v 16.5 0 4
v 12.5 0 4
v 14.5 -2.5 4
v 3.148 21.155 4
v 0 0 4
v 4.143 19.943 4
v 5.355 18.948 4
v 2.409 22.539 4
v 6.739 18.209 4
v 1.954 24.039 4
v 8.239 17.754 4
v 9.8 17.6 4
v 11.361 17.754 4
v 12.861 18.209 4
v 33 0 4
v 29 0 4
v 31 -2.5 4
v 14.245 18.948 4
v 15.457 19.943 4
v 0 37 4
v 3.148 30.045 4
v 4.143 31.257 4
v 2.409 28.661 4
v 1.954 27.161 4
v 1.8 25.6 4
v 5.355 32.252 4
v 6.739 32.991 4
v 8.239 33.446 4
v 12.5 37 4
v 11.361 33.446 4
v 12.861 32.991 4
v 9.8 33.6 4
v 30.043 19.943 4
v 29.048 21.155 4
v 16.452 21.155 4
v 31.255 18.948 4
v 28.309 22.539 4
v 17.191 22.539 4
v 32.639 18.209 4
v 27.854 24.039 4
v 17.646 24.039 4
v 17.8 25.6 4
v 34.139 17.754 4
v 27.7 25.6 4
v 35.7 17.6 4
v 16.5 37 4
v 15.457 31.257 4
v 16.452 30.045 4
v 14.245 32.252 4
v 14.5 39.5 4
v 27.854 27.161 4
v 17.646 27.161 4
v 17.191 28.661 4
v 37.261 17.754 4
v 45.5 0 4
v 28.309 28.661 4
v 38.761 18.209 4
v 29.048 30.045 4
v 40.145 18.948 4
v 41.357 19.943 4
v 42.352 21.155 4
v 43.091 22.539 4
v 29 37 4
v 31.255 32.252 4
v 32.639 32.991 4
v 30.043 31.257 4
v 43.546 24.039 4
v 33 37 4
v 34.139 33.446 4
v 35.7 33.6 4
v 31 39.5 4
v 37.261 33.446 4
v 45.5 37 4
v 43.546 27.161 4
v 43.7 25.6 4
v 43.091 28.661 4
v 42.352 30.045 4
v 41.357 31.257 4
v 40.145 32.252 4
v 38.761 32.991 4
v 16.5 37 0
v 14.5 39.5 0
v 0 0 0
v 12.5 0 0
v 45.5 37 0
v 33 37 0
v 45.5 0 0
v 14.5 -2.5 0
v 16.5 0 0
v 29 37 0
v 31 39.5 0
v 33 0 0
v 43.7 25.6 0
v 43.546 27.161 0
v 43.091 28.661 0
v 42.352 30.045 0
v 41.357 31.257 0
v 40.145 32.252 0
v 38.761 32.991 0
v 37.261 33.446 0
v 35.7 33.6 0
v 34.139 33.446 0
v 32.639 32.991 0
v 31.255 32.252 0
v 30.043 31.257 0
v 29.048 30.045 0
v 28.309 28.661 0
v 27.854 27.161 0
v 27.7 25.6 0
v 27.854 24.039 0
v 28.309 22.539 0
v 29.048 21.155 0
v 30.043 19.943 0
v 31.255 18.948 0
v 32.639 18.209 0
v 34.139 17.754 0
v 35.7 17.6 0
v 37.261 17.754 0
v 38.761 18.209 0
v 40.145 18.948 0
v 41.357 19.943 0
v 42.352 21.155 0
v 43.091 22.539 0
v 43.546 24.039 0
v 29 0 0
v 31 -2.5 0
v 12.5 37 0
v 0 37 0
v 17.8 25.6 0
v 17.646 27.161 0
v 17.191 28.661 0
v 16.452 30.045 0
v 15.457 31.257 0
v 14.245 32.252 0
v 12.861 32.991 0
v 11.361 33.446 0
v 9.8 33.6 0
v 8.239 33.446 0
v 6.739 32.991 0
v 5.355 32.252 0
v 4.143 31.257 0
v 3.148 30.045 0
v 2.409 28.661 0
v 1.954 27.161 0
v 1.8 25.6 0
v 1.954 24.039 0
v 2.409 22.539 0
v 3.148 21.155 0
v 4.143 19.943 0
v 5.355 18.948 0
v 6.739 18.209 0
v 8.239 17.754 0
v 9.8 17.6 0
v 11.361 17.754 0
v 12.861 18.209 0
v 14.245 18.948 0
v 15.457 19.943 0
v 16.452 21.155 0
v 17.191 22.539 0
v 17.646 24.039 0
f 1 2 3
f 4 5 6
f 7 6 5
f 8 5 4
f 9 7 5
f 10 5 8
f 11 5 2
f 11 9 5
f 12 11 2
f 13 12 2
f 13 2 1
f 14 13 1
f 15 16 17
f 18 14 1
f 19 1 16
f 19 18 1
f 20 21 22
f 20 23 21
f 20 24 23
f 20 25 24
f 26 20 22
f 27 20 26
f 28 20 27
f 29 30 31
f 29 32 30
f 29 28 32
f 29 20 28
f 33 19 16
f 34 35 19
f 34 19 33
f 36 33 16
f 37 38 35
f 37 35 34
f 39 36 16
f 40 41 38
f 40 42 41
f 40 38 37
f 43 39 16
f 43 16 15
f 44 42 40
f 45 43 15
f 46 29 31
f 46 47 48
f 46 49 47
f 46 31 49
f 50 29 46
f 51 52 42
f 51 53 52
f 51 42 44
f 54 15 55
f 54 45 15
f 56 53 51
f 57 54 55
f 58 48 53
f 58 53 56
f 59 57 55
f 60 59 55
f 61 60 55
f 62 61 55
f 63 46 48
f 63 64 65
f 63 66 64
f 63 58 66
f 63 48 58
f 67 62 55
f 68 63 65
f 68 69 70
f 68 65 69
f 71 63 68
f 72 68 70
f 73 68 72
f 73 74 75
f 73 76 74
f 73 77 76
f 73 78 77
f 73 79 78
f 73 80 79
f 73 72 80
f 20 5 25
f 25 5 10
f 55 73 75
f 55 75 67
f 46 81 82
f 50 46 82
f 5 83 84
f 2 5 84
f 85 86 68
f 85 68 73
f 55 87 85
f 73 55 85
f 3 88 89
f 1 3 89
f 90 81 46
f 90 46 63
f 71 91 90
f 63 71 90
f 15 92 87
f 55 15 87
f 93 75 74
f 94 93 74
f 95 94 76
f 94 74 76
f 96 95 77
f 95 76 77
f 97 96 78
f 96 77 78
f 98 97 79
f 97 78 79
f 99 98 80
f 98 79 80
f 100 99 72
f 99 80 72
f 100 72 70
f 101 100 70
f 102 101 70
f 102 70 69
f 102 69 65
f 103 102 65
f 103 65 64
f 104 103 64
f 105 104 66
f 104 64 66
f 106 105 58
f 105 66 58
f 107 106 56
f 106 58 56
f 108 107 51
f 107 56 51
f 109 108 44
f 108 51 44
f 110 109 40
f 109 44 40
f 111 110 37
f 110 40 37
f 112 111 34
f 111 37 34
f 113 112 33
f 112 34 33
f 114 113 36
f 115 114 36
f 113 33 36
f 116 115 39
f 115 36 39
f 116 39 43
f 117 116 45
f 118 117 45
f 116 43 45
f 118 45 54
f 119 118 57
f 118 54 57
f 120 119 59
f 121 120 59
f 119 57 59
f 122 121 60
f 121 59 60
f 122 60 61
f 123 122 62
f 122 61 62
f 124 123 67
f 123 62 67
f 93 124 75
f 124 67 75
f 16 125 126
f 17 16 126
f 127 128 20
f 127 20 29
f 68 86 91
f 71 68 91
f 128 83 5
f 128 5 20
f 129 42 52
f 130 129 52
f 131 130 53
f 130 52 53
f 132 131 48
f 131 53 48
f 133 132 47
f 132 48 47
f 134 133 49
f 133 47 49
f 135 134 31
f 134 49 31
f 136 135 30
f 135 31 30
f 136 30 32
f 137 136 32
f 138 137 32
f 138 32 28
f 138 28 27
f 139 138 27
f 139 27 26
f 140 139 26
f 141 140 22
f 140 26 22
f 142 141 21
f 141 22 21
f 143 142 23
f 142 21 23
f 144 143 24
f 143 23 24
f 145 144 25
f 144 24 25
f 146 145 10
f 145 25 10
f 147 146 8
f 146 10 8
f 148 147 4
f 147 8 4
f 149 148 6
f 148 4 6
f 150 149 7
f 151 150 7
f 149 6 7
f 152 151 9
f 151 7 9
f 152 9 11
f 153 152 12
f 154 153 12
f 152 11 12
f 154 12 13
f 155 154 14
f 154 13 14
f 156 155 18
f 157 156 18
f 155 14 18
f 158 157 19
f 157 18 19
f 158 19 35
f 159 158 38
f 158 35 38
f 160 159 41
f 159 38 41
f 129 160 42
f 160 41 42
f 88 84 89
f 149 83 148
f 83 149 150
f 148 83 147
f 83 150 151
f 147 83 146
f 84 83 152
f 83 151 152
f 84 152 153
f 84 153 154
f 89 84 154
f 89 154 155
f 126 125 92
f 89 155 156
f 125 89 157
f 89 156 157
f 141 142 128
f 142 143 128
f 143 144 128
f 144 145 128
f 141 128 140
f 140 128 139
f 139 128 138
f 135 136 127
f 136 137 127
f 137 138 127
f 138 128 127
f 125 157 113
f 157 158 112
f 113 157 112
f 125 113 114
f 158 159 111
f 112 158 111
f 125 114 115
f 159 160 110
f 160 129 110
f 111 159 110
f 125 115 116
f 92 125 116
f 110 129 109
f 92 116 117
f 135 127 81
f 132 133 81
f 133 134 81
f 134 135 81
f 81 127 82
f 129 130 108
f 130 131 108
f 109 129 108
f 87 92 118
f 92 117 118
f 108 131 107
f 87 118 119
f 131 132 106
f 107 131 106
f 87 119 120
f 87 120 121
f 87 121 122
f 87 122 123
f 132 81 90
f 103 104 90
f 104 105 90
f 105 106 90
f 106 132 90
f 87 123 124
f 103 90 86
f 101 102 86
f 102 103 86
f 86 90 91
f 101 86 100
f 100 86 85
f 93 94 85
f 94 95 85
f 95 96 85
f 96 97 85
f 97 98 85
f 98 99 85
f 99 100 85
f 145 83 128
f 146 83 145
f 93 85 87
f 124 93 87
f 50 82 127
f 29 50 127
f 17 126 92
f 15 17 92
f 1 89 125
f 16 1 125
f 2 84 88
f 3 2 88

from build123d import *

# Parameters (mm, degrees)
SKETCH1_W      = 45.5
SKETCH1_H      = 37
BASIS_DEPTH    = 4
SKETCH3_R      = 8
HR04_GAT_DEPTH = 4


with BuildPart() as part:
    # Sketch1 → Basis (new body)
    with BuildSketch(Plane.XY):
        with Locations((22.75, 18.5)):
            Rectangle(SKETCH1_W, SKETCH1_H)
        Polygon((14.5, 39.5), (12.5, 37), (16.5, 37), align=None)
        Polygon((31, 39.5), (29, 37), (33, 37), align=None)
        Polygon((16.5, 0), (12.5, 0), (14.5, -2.5), align=None)
        Polygon((33, 0), (29, 0), (31, -2.5), align=None)
    extrude(amount=BASIS_DEPTH)

    # Sketch3 → HR04 gat (cut)
    with BuildSketch(Plane.XY.offset(4)):
        with Locations((9.8, 25.6)):
            Circle(SKETCH3_R)
        with Locations((35.7, 25.6)):
            Circle(SKETCH3_R)
    extrude(amount=-HR04_GAT_DEPTH, mode=Mode.SUBTRACT)


solid = part.part
